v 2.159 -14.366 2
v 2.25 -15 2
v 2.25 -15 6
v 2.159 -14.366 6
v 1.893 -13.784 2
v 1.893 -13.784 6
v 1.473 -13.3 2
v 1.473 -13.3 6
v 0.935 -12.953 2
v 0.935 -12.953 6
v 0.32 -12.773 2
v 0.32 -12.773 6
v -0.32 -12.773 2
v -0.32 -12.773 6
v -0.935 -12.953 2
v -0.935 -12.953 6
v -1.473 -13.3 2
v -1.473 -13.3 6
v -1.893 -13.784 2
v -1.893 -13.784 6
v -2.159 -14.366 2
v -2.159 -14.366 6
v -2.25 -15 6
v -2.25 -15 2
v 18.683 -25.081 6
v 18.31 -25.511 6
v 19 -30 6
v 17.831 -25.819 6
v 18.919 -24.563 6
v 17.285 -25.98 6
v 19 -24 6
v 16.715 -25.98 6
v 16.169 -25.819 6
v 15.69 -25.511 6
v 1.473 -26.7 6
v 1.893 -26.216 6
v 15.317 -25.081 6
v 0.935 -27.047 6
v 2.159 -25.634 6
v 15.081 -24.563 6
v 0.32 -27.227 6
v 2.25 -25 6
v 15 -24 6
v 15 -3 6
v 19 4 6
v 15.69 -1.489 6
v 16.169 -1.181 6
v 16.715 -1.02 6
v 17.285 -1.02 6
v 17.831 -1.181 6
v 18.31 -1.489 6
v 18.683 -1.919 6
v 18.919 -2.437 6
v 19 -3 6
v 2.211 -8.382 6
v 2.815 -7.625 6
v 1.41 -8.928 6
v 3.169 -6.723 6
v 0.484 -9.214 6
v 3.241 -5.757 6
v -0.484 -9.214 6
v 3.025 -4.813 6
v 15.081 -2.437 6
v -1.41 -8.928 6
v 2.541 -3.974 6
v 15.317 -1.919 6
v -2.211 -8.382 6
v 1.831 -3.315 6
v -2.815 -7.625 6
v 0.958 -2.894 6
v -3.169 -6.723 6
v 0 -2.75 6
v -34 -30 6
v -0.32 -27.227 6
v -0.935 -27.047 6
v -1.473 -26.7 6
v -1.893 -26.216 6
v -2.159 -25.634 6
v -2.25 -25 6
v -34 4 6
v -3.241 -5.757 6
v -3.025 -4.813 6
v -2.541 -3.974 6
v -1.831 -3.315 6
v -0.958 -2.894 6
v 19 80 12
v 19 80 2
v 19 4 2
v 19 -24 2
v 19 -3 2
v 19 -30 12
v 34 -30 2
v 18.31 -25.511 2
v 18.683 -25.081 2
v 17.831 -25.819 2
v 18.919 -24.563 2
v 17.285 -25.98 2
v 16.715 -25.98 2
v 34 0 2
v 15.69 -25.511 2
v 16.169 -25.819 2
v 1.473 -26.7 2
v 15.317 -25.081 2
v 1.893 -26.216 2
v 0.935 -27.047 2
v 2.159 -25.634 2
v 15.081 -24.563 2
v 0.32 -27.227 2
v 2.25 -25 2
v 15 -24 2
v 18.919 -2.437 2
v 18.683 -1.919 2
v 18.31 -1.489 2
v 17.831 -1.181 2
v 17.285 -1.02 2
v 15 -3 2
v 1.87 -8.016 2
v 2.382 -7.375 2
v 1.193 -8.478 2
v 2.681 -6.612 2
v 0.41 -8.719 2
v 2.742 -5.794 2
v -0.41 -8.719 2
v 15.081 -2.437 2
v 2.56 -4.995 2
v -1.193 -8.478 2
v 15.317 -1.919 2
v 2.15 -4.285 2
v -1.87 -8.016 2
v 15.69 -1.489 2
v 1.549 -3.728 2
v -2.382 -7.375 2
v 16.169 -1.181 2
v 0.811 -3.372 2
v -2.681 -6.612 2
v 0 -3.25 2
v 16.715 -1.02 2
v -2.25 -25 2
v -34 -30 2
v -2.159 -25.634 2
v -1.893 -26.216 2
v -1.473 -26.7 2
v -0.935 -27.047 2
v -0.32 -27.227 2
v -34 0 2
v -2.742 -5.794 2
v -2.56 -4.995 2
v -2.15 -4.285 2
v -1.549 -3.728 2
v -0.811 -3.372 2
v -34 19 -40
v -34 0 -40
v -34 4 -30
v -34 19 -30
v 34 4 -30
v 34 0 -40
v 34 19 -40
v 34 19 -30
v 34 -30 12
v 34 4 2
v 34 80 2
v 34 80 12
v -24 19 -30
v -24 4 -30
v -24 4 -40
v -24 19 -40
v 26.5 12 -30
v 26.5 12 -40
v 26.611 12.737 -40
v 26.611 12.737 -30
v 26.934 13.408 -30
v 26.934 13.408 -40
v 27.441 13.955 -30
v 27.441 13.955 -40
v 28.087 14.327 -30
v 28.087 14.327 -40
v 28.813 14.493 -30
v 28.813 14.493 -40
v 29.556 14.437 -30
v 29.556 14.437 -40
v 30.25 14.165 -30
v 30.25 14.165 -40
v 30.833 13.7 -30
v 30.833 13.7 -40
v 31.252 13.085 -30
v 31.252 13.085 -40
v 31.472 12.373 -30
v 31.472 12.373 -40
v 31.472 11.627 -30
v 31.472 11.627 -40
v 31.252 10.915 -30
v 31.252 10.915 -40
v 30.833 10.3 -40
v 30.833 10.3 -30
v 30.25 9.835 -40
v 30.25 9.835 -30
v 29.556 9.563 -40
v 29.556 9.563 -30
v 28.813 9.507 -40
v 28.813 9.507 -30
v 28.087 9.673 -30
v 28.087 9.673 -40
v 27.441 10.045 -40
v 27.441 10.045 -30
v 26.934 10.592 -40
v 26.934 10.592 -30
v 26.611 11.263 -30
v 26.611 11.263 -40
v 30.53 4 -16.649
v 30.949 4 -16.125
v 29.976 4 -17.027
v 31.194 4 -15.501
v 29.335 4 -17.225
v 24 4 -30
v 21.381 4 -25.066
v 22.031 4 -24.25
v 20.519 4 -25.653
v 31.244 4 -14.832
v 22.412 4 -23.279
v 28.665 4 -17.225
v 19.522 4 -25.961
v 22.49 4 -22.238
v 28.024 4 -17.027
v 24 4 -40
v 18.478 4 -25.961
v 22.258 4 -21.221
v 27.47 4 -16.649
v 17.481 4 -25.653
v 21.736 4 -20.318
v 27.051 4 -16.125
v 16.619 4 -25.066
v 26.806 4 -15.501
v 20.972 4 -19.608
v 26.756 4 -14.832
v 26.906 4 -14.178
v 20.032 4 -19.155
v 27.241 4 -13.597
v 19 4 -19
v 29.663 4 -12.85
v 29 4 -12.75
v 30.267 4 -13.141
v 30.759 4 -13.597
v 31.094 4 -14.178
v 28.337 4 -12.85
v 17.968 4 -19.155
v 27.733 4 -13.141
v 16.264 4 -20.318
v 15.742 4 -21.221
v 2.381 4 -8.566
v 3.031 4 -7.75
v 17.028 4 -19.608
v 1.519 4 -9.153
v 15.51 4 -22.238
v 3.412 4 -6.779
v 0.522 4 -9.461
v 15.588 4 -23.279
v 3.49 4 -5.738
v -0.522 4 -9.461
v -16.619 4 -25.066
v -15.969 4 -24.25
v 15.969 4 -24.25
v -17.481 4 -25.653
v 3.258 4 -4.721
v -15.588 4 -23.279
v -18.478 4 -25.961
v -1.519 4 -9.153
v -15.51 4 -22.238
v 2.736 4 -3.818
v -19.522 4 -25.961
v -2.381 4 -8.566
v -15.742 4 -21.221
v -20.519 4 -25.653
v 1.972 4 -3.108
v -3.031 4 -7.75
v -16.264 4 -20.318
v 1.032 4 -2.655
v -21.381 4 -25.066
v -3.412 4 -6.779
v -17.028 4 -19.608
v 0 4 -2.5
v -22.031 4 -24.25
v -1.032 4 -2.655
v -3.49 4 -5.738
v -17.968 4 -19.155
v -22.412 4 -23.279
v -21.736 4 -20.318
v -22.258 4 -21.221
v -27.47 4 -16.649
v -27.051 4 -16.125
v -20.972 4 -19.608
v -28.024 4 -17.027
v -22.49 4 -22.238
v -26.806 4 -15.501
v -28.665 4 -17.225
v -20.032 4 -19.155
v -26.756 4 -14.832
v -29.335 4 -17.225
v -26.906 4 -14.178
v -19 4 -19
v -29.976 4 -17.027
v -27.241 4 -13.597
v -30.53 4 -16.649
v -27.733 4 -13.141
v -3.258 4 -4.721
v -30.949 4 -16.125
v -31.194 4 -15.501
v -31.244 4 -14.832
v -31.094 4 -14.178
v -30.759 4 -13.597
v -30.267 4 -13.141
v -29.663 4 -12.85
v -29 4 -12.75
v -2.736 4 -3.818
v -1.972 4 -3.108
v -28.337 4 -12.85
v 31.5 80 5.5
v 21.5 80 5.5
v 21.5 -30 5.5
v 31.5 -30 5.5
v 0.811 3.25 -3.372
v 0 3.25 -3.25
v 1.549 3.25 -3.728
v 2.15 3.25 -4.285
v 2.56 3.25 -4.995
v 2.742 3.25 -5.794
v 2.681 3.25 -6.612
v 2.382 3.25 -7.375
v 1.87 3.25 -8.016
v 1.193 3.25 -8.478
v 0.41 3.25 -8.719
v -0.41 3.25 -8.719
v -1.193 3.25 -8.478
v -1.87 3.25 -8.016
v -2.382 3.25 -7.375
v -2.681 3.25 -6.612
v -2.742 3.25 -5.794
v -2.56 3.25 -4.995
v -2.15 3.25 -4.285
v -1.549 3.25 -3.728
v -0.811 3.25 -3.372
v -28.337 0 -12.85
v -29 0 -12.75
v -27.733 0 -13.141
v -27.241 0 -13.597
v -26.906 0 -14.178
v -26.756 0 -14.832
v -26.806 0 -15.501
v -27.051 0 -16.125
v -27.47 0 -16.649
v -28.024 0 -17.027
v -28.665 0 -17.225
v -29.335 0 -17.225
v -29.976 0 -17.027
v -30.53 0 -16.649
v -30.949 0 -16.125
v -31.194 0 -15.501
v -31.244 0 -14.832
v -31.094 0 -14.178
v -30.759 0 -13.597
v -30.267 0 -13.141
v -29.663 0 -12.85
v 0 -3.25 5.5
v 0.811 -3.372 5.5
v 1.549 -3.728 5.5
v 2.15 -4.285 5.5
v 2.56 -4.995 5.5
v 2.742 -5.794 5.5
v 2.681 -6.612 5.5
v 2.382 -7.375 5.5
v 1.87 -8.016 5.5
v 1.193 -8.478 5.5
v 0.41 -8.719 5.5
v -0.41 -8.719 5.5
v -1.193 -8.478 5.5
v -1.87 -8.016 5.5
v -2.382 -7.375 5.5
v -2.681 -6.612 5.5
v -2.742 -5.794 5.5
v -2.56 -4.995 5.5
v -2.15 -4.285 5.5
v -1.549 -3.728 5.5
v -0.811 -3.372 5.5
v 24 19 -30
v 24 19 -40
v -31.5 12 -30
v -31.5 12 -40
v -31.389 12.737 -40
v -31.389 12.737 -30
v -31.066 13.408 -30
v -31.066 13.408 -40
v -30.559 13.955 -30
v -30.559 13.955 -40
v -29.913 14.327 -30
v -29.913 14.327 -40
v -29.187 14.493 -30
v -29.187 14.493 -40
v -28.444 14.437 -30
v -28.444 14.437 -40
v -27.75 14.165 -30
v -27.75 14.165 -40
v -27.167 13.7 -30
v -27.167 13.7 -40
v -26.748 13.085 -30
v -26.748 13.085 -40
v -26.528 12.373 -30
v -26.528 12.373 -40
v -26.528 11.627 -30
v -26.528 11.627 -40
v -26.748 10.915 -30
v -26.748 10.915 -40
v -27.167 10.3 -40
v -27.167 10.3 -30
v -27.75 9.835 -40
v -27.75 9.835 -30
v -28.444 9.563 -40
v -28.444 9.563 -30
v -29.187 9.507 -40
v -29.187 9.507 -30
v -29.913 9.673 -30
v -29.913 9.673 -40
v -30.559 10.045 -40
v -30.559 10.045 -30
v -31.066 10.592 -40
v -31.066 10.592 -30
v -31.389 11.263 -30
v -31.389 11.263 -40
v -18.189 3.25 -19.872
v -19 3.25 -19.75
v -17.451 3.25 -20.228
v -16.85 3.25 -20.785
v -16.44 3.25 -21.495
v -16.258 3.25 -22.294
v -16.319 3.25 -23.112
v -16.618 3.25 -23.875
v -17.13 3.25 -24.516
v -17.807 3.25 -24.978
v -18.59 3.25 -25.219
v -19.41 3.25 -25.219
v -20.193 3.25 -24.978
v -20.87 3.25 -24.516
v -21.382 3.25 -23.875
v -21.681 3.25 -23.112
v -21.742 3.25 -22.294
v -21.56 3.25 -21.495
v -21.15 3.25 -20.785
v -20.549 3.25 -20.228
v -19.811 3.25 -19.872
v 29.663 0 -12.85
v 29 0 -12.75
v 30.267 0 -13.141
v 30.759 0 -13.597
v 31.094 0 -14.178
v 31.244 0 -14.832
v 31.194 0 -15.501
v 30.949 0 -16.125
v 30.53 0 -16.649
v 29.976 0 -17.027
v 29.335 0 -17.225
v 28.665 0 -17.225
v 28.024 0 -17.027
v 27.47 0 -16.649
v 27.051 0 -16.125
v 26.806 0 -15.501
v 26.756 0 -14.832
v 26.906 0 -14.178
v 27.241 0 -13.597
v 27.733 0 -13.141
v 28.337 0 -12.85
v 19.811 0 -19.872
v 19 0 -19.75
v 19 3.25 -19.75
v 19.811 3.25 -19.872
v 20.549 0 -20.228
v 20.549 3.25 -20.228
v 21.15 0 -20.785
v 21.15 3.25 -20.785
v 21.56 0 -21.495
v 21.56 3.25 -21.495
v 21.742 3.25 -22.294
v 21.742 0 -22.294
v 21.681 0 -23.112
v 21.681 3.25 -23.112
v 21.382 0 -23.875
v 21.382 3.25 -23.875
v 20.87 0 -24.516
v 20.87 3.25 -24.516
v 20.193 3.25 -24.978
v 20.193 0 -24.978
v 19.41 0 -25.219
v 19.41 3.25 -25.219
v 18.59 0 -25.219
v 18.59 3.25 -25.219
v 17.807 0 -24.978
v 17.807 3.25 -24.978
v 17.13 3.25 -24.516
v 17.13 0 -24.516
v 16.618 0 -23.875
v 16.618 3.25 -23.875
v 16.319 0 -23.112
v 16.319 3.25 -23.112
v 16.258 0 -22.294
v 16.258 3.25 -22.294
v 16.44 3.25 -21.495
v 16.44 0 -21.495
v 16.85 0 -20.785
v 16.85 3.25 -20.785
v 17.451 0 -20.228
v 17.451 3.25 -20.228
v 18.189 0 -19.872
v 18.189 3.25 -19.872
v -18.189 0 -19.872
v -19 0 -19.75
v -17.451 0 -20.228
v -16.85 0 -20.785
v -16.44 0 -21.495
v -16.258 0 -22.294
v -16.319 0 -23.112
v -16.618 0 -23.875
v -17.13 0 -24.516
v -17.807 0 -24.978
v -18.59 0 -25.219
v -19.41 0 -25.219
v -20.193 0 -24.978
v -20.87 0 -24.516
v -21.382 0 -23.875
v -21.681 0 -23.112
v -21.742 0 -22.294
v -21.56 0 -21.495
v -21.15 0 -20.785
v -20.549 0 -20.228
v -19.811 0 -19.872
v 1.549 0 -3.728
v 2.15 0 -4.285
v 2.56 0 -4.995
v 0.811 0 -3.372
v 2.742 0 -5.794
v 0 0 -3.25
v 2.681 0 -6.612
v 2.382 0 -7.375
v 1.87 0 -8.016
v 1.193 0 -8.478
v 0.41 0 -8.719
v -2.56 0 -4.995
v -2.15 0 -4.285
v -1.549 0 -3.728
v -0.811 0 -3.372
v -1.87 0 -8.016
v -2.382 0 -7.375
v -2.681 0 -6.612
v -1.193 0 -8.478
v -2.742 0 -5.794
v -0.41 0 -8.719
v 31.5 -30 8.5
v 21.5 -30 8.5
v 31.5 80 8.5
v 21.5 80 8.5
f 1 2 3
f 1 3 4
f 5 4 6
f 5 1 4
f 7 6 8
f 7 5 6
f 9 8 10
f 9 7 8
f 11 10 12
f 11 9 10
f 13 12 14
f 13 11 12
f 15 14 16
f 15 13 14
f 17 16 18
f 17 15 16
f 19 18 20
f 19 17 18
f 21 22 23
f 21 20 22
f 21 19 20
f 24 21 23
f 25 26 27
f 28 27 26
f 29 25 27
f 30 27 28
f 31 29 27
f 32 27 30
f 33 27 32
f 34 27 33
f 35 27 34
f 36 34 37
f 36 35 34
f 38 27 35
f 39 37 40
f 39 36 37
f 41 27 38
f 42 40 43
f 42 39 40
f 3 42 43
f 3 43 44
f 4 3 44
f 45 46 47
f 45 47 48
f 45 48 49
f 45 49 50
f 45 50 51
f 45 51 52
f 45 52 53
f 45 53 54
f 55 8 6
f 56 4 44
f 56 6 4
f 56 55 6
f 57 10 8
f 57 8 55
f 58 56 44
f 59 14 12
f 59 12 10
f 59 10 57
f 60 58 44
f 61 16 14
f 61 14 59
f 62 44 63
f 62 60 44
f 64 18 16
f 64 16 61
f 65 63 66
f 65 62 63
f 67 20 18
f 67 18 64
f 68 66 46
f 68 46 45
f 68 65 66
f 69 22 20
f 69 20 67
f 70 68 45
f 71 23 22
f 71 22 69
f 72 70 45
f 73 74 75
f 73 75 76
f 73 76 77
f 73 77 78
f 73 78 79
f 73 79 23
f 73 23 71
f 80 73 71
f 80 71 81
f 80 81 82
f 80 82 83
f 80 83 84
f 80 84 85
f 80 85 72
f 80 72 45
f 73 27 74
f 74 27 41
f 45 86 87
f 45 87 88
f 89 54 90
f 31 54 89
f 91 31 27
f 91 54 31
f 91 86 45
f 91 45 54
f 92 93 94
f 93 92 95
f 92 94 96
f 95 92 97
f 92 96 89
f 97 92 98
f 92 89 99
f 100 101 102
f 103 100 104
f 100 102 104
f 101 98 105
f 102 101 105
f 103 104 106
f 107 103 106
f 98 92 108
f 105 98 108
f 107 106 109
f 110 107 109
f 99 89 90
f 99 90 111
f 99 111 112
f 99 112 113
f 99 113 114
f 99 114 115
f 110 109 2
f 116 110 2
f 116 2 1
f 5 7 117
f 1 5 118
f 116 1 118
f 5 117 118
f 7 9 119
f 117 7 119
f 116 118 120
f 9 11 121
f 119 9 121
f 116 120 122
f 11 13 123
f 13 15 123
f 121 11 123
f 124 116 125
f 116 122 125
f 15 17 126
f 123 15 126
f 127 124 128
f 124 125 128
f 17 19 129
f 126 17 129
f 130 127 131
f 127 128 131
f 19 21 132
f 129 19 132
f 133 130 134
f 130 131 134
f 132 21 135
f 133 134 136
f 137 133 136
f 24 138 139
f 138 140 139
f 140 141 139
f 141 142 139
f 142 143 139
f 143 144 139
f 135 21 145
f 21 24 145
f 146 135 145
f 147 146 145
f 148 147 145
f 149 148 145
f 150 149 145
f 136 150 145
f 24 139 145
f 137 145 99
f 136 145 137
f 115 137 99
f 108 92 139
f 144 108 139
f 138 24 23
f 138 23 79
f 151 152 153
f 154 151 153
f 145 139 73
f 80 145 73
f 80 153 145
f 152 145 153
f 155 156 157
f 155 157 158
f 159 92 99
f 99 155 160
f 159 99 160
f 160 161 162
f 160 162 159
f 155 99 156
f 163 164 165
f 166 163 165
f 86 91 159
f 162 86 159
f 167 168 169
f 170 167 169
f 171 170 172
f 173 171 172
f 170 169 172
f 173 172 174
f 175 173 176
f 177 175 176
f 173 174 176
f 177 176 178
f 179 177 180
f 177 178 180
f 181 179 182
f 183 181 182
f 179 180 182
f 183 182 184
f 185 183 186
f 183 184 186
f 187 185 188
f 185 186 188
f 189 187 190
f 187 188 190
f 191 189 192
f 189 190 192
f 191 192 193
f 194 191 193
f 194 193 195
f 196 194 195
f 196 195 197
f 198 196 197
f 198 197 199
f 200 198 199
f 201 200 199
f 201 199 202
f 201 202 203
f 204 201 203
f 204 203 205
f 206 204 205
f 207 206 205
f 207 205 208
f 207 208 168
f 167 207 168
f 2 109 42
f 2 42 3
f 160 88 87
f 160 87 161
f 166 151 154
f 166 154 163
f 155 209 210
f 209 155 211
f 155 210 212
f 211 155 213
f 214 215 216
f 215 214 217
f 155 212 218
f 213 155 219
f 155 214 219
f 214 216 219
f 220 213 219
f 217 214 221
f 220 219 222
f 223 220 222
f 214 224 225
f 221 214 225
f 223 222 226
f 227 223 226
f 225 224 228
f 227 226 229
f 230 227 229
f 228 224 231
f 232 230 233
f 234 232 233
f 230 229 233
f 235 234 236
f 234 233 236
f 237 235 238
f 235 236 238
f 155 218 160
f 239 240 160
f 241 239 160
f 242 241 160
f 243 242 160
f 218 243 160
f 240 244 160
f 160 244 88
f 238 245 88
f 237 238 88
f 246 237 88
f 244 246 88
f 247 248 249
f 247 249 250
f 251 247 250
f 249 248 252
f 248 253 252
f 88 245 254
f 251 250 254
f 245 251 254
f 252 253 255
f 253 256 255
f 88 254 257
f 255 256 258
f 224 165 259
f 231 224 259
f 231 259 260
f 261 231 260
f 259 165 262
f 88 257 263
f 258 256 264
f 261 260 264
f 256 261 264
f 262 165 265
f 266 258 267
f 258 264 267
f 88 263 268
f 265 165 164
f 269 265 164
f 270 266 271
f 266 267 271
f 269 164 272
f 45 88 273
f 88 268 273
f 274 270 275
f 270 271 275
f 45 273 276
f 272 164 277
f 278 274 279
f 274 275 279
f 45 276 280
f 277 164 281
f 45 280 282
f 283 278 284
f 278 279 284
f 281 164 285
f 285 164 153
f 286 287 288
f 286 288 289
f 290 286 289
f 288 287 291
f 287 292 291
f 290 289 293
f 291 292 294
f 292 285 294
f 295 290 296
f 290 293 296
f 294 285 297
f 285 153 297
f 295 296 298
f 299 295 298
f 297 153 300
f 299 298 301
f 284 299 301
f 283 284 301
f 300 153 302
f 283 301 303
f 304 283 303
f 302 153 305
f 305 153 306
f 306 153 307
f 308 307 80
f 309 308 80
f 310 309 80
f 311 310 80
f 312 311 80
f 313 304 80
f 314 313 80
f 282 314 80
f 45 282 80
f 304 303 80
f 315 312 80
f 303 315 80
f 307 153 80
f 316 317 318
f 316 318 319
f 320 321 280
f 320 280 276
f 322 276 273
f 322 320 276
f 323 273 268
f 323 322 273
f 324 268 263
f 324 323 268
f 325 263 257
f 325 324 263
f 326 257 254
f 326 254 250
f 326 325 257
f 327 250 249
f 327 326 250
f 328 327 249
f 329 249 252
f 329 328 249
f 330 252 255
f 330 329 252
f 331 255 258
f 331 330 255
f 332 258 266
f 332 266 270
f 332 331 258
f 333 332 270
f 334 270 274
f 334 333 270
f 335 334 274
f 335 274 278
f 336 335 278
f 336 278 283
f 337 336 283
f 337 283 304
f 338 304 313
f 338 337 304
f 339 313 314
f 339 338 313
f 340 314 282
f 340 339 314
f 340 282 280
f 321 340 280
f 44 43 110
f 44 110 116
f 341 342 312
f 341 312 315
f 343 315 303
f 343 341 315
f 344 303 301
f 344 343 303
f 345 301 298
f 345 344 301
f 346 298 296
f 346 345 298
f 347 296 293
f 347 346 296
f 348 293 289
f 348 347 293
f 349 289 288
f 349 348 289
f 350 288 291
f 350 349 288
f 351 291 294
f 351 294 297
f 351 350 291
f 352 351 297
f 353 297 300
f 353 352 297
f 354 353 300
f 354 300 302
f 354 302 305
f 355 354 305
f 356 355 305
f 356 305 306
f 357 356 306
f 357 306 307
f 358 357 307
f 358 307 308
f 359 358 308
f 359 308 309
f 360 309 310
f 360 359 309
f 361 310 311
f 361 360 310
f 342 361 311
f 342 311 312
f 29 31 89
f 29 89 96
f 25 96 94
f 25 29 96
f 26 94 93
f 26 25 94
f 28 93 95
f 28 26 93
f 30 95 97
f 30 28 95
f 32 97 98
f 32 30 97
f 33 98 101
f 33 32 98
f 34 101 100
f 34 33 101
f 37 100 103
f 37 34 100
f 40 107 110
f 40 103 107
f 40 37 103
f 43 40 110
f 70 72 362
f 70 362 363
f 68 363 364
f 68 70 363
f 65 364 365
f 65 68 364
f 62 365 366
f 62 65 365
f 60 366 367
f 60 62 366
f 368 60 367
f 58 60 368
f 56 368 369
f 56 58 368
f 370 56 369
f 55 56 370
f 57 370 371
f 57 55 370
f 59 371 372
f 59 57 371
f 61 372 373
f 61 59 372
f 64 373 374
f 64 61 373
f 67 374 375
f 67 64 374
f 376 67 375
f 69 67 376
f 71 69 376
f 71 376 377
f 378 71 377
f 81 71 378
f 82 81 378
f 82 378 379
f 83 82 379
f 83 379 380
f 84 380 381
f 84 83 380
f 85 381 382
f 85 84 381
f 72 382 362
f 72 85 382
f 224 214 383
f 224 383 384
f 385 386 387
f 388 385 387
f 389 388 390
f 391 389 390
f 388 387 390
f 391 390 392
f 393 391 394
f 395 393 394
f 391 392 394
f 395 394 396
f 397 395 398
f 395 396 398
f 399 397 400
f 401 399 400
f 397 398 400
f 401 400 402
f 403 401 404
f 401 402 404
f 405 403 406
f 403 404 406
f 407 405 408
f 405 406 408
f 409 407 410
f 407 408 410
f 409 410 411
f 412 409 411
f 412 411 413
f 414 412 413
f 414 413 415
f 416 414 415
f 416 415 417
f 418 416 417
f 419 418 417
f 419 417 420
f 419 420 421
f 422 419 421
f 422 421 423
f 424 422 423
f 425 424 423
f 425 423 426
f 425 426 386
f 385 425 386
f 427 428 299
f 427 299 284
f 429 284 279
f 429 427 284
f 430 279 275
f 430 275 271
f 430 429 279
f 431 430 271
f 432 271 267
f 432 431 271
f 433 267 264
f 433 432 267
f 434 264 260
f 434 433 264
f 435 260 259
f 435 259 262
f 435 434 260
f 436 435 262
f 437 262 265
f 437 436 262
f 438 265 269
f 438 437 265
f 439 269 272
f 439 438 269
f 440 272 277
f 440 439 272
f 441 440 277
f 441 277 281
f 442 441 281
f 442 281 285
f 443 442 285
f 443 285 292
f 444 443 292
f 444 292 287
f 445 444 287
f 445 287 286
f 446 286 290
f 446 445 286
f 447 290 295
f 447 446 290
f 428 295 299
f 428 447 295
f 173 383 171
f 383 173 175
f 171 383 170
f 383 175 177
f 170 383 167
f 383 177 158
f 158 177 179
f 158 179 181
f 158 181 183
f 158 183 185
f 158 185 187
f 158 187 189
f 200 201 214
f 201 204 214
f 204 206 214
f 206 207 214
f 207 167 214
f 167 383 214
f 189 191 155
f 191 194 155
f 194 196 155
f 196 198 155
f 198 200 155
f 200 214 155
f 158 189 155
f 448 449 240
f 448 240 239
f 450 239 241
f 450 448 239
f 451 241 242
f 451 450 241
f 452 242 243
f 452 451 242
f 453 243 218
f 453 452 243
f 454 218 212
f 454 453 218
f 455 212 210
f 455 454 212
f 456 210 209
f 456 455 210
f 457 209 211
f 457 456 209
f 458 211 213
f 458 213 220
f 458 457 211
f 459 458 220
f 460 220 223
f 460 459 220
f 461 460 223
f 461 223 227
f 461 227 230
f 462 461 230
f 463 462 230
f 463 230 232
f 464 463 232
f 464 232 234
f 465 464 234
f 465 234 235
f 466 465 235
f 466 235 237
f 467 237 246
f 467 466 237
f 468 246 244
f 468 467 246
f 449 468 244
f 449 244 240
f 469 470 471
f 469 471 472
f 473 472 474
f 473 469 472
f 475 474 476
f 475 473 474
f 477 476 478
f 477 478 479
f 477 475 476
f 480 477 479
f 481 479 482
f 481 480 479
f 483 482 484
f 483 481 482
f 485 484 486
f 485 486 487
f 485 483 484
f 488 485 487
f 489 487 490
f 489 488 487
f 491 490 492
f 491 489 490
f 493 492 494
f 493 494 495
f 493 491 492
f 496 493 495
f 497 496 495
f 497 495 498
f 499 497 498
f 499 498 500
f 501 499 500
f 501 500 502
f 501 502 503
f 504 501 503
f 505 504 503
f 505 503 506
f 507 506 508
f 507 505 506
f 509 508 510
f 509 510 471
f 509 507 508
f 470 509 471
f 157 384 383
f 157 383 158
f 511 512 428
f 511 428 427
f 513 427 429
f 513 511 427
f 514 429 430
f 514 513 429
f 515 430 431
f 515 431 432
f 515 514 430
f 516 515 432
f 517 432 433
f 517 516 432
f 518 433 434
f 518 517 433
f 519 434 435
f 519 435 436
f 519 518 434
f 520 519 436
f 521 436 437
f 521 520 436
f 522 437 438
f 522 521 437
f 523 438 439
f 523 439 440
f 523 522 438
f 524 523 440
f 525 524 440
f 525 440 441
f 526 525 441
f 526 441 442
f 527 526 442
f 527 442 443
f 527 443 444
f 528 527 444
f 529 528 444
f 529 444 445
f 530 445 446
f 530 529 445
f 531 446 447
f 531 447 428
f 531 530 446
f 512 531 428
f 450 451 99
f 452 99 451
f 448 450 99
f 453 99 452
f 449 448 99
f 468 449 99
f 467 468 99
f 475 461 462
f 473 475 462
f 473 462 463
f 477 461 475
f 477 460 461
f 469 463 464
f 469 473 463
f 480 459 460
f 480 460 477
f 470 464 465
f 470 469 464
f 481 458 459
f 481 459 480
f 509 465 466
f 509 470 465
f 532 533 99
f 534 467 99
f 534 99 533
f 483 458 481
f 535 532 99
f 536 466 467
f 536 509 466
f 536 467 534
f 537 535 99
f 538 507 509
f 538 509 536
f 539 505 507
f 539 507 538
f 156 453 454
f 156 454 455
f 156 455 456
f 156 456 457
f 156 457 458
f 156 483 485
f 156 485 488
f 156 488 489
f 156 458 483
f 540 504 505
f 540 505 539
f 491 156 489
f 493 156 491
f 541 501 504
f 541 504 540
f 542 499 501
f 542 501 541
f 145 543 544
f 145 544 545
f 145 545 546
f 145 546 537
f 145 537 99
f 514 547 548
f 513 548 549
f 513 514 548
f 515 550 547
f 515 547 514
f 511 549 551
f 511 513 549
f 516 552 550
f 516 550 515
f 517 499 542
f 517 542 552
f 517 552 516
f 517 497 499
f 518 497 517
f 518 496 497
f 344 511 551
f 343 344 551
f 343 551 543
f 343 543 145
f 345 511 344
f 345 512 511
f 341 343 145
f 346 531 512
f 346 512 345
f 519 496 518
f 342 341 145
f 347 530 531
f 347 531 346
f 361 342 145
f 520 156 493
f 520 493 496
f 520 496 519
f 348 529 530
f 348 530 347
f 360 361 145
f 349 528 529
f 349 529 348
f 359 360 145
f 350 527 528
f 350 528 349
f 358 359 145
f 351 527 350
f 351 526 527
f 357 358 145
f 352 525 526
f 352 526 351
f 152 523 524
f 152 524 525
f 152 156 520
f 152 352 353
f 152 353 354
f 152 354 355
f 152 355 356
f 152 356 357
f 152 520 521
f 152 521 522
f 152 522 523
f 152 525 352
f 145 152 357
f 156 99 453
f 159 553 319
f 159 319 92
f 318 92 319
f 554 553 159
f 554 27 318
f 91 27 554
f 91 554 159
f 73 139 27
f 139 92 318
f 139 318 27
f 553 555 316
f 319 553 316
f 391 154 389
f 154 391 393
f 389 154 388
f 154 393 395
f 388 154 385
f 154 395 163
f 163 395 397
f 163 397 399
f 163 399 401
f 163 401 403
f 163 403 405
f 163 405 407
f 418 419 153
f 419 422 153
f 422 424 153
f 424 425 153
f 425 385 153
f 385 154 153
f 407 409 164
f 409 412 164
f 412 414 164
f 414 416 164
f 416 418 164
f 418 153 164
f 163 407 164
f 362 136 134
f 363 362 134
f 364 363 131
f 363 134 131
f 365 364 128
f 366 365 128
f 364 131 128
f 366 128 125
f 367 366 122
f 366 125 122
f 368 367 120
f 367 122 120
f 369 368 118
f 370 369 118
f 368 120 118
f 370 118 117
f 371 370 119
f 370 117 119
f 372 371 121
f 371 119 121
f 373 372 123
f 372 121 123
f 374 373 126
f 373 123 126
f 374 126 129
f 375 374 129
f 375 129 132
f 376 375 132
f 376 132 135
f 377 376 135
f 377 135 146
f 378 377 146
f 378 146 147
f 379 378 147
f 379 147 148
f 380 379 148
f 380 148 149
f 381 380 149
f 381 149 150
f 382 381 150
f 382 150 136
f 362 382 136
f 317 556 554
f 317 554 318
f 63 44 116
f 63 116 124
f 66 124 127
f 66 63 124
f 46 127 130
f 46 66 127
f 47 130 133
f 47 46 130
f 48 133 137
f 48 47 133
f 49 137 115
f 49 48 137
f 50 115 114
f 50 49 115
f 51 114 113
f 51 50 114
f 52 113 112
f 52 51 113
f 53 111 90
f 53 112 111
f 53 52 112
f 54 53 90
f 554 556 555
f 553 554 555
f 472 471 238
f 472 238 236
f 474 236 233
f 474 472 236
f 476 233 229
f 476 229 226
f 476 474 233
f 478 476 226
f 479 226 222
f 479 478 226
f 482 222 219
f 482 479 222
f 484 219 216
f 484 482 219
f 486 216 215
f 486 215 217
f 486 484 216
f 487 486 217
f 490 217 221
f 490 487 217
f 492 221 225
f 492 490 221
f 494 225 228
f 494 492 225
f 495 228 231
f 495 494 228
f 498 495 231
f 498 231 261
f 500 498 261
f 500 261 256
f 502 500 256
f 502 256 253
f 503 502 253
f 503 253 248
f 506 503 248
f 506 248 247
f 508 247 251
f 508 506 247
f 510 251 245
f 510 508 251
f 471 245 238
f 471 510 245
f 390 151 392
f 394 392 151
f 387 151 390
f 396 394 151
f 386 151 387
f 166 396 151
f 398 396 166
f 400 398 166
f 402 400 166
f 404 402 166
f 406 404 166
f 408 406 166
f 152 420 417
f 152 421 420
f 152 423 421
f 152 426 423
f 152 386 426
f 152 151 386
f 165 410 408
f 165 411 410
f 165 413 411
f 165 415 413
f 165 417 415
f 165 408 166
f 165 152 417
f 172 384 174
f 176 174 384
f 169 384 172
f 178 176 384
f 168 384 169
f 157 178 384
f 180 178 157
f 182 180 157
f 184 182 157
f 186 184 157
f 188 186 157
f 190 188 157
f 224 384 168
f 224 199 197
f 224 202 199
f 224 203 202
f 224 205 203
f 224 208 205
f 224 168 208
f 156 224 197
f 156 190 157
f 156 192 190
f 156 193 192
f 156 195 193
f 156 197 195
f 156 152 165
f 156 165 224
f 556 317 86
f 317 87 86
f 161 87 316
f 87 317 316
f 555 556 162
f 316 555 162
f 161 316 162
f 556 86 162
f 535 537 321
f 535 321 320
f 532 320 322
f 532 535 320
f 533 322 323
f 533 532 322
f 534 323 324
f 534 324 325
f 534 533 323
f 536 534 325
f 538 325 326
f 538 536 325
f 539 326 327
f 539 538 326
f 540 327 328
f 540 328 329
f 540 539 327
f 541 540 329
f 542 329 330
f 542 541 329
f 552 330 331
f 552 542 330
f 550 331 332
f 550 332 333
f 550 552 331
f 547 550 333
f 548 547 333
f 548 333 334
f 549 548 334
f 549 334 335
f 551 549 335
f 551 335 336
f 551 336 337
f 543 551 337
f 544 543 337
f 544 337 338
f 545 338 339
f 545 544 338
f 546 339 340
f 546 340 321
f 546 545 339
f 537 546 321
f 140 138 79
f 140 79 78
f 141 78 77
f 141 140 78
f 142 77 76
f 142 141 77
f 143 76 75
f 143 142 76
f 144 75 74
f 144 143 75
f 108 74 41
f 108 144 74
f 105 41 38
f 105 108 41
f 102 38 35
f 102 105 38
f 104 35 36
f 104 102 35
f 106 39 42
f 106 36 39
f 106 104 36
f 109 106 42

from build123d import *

# Parameters (mm, degrees)
SKETCH1_R           = 2.75
SKETCH1_R_2         = 2.25
BOSS_EXTRUDE1_DEPTH = 4
SKETCH3_W           = 10
SKETCH3_H           = 10
BOSS_EXTRUDE3_DEPTH = 15
SKETCH4_R           = 2.5
CUT_EXTRUDE1_DEPTH  = 58.280013966
CHAMFER1_SIZE       = 0.75
SKETCH5_W           = 4
SKETCH5_H           = 34
BOSS_EXTRUDE4_DEPTH = 68
SKETCH7_R           = 2.75
CUT_EXTRUDE2_DEPTH  = 62.806148561
CHAMFER2_SIZE       = 0.5
SKETCH8_W           = 15
SKETCH8_H           = 10
BOSS_EXTRUDE5_DEPTH = 110
CUT_EXTRUDE3_DEPTH  = 99.346326825
SKETCH10_W          = 10
SKETCH10_H          = 3
CUT_EXTRUDE4_DEPTH  = 122.885191882


with BuildPart() as part:
    # Sketch1 → Boss-Extrude1 (new body)
    with BuildSketch(Plane(origin=(0, 0, 0), x_dir=(1, 0, 0), z_dir=(0, 1, 0))):
        Polygon((-34, 0), (-34, 40), (34, 40), (34, 0), (34, -2), (-34, -2), align=None)
        with Locations(Location((-19, 22.5, 0), (0, 0, 270))):
            Circle(SKETCH1_R, mode=Mode.SUBTRACT)
        with Locations(Location((19, 22.5, 0), (0, 0, 270))):
            Circle(SKETCH1_R, mode=Mode.SUBTRACT)
        with Locations(Location((-29, 15, 0), (0, 0, 270))):
            Circle(SKETCH1_R_2, mode=Mode.SUBTRACT)
        with Locations(Location((29, 15, 0), (0, 0, 270))):
            Circle(SKETCH1_R_2, mode=Mode.SUBTRACT)
        with Locations(Location((0, 6, 0), (0, 0, 270))):
            Circle(SKETCH1_R, mode=Mode.SUBTRACT)
    extrude(amount=BOSS_EXTRUDE1_DEPTH)

    # Sketch3 → Boss-Extrude3 (add)
    with BuildSketch(Plane(origin=(0, 4, 0), x_dir=(1, 0, 0), z_dir=(0, 1, 0))):
        with Locations((-29, 35)):
            Rectangle(SKETCH3_W, SKETCH3_H)
        with Locations((29, 35)):
            Rectangle(SKETCH3_W, SKETCH3_H)
    extrude(amount=BOSS_EXTRUDE3_DEPTH)

    # Sketch4 → Cut-Extrude1 (cut, through all)
    with BuildSketch(Plane(origin=(0, 0, -40), x_dir=(-1, 0, 0), z_dir=(0, 0, -1))):
        with Locations((-29, 12)):
            Circle(SKETCH4_R)
        with Locations((29, 12)):
            Circle(SKETCH4_R)
    extrude(amount=-CUT_EXTRUDE1_DEPTH, mode=Mode.SUBTRACT)

    # Chamfer1
    chamfer1_edges = [part.edges().sort_by_distance(p)[0] for p in [
        (-19, 4, -25.25),
        (19, 4, -25.25),
        (0, 4, -8.75),
    ]]
    chamfer(chamfer1_edges, length=CHAMFER1_SIZE)

    # Sketch5 → Boss-Extrude4 (add)
    with BuildSketch(Plane.ZY.offset(34)):
        with Locations((4, -13)):
            Rectangle(SKETCH5_W, SKETCH5_H)
    extrude(amount=-BOSS_EXTRUDE4_DEPTH)

    # Sketch7 → Cut-Extrude2 (cut, through all)
    with BuildSketch(Plane(origin=(0, 0, 2), x_dir=(-1, 0, 0), z_dir=(0, 0, -1))):
        with Locations(Location((0, -6, 0), (0, 0, 90))):
            Circle(SKETCH7_R)
        with BuildLine():
            Line((2.25, -15), (2.25, -25))
            ThreePointArc((2.25, -25), (0, -27.25), (-2.25, -25))
            Line((-2.25, -25), (-2.25, -15))
            ThreePointArc((-2.25, -15), (0, -12.75), (2.25, -15))
        make_face()
    extrude(amount=-CUT_EXTRUDE2_DEPTH, mode=Mode.SUBTRACT)

    # Chamfer2
    chamfer2_edges = [part.edges().sort_by_distance(p)[0] for p in [
        (0, -8.75, 6),
    ]]
    chamfer(chamfer2_edges, length=CHAMFER2_SIZE)

    # Sketch8 → Boss-Extrude5 (add)
    with BuildSketch(Plane.XZ.offset(30)):
        with Locations((26.5, 7)):
            Rectangle(SKETCH8_W, SKETCH8_H)
    extrude(amount=-BOSS_EXTRUDE5_DEPTH)

    # Sketch9 → Cut-Extrude3 (cut, through all)
    with BuildSketch(Plane.XY.offset(6)):
        with BuildLine():
            Line((19, -3), (19, -24))
            ThreePointArc((19, -24), (17, -26), (15, -24))
            Line((15, -24), (15, -3))
            ThreePointArc((15, -3), (17, -1), (19, -3))
        make_face()
    extrude(amount=-CUT_EXTRUDE3_DEPTH, mode=Mode.SUBTRACT)

    # Sketch10 → Cut-Extrude4 (cut, through all)
    with BuildSketch(Plane(origin=(0, 80, 0), x_dir=(1, 0, 0), z_dir=(0, 1, 0))):
        with Locations((26.5, -7)):
            Rectangle(SKETCH10_W, SKETCH10_H)
    extrude(amount=-CUT_EXTRUDE4_DEPTH, mode=Mode.SUBTRACT)


solid = part.part
